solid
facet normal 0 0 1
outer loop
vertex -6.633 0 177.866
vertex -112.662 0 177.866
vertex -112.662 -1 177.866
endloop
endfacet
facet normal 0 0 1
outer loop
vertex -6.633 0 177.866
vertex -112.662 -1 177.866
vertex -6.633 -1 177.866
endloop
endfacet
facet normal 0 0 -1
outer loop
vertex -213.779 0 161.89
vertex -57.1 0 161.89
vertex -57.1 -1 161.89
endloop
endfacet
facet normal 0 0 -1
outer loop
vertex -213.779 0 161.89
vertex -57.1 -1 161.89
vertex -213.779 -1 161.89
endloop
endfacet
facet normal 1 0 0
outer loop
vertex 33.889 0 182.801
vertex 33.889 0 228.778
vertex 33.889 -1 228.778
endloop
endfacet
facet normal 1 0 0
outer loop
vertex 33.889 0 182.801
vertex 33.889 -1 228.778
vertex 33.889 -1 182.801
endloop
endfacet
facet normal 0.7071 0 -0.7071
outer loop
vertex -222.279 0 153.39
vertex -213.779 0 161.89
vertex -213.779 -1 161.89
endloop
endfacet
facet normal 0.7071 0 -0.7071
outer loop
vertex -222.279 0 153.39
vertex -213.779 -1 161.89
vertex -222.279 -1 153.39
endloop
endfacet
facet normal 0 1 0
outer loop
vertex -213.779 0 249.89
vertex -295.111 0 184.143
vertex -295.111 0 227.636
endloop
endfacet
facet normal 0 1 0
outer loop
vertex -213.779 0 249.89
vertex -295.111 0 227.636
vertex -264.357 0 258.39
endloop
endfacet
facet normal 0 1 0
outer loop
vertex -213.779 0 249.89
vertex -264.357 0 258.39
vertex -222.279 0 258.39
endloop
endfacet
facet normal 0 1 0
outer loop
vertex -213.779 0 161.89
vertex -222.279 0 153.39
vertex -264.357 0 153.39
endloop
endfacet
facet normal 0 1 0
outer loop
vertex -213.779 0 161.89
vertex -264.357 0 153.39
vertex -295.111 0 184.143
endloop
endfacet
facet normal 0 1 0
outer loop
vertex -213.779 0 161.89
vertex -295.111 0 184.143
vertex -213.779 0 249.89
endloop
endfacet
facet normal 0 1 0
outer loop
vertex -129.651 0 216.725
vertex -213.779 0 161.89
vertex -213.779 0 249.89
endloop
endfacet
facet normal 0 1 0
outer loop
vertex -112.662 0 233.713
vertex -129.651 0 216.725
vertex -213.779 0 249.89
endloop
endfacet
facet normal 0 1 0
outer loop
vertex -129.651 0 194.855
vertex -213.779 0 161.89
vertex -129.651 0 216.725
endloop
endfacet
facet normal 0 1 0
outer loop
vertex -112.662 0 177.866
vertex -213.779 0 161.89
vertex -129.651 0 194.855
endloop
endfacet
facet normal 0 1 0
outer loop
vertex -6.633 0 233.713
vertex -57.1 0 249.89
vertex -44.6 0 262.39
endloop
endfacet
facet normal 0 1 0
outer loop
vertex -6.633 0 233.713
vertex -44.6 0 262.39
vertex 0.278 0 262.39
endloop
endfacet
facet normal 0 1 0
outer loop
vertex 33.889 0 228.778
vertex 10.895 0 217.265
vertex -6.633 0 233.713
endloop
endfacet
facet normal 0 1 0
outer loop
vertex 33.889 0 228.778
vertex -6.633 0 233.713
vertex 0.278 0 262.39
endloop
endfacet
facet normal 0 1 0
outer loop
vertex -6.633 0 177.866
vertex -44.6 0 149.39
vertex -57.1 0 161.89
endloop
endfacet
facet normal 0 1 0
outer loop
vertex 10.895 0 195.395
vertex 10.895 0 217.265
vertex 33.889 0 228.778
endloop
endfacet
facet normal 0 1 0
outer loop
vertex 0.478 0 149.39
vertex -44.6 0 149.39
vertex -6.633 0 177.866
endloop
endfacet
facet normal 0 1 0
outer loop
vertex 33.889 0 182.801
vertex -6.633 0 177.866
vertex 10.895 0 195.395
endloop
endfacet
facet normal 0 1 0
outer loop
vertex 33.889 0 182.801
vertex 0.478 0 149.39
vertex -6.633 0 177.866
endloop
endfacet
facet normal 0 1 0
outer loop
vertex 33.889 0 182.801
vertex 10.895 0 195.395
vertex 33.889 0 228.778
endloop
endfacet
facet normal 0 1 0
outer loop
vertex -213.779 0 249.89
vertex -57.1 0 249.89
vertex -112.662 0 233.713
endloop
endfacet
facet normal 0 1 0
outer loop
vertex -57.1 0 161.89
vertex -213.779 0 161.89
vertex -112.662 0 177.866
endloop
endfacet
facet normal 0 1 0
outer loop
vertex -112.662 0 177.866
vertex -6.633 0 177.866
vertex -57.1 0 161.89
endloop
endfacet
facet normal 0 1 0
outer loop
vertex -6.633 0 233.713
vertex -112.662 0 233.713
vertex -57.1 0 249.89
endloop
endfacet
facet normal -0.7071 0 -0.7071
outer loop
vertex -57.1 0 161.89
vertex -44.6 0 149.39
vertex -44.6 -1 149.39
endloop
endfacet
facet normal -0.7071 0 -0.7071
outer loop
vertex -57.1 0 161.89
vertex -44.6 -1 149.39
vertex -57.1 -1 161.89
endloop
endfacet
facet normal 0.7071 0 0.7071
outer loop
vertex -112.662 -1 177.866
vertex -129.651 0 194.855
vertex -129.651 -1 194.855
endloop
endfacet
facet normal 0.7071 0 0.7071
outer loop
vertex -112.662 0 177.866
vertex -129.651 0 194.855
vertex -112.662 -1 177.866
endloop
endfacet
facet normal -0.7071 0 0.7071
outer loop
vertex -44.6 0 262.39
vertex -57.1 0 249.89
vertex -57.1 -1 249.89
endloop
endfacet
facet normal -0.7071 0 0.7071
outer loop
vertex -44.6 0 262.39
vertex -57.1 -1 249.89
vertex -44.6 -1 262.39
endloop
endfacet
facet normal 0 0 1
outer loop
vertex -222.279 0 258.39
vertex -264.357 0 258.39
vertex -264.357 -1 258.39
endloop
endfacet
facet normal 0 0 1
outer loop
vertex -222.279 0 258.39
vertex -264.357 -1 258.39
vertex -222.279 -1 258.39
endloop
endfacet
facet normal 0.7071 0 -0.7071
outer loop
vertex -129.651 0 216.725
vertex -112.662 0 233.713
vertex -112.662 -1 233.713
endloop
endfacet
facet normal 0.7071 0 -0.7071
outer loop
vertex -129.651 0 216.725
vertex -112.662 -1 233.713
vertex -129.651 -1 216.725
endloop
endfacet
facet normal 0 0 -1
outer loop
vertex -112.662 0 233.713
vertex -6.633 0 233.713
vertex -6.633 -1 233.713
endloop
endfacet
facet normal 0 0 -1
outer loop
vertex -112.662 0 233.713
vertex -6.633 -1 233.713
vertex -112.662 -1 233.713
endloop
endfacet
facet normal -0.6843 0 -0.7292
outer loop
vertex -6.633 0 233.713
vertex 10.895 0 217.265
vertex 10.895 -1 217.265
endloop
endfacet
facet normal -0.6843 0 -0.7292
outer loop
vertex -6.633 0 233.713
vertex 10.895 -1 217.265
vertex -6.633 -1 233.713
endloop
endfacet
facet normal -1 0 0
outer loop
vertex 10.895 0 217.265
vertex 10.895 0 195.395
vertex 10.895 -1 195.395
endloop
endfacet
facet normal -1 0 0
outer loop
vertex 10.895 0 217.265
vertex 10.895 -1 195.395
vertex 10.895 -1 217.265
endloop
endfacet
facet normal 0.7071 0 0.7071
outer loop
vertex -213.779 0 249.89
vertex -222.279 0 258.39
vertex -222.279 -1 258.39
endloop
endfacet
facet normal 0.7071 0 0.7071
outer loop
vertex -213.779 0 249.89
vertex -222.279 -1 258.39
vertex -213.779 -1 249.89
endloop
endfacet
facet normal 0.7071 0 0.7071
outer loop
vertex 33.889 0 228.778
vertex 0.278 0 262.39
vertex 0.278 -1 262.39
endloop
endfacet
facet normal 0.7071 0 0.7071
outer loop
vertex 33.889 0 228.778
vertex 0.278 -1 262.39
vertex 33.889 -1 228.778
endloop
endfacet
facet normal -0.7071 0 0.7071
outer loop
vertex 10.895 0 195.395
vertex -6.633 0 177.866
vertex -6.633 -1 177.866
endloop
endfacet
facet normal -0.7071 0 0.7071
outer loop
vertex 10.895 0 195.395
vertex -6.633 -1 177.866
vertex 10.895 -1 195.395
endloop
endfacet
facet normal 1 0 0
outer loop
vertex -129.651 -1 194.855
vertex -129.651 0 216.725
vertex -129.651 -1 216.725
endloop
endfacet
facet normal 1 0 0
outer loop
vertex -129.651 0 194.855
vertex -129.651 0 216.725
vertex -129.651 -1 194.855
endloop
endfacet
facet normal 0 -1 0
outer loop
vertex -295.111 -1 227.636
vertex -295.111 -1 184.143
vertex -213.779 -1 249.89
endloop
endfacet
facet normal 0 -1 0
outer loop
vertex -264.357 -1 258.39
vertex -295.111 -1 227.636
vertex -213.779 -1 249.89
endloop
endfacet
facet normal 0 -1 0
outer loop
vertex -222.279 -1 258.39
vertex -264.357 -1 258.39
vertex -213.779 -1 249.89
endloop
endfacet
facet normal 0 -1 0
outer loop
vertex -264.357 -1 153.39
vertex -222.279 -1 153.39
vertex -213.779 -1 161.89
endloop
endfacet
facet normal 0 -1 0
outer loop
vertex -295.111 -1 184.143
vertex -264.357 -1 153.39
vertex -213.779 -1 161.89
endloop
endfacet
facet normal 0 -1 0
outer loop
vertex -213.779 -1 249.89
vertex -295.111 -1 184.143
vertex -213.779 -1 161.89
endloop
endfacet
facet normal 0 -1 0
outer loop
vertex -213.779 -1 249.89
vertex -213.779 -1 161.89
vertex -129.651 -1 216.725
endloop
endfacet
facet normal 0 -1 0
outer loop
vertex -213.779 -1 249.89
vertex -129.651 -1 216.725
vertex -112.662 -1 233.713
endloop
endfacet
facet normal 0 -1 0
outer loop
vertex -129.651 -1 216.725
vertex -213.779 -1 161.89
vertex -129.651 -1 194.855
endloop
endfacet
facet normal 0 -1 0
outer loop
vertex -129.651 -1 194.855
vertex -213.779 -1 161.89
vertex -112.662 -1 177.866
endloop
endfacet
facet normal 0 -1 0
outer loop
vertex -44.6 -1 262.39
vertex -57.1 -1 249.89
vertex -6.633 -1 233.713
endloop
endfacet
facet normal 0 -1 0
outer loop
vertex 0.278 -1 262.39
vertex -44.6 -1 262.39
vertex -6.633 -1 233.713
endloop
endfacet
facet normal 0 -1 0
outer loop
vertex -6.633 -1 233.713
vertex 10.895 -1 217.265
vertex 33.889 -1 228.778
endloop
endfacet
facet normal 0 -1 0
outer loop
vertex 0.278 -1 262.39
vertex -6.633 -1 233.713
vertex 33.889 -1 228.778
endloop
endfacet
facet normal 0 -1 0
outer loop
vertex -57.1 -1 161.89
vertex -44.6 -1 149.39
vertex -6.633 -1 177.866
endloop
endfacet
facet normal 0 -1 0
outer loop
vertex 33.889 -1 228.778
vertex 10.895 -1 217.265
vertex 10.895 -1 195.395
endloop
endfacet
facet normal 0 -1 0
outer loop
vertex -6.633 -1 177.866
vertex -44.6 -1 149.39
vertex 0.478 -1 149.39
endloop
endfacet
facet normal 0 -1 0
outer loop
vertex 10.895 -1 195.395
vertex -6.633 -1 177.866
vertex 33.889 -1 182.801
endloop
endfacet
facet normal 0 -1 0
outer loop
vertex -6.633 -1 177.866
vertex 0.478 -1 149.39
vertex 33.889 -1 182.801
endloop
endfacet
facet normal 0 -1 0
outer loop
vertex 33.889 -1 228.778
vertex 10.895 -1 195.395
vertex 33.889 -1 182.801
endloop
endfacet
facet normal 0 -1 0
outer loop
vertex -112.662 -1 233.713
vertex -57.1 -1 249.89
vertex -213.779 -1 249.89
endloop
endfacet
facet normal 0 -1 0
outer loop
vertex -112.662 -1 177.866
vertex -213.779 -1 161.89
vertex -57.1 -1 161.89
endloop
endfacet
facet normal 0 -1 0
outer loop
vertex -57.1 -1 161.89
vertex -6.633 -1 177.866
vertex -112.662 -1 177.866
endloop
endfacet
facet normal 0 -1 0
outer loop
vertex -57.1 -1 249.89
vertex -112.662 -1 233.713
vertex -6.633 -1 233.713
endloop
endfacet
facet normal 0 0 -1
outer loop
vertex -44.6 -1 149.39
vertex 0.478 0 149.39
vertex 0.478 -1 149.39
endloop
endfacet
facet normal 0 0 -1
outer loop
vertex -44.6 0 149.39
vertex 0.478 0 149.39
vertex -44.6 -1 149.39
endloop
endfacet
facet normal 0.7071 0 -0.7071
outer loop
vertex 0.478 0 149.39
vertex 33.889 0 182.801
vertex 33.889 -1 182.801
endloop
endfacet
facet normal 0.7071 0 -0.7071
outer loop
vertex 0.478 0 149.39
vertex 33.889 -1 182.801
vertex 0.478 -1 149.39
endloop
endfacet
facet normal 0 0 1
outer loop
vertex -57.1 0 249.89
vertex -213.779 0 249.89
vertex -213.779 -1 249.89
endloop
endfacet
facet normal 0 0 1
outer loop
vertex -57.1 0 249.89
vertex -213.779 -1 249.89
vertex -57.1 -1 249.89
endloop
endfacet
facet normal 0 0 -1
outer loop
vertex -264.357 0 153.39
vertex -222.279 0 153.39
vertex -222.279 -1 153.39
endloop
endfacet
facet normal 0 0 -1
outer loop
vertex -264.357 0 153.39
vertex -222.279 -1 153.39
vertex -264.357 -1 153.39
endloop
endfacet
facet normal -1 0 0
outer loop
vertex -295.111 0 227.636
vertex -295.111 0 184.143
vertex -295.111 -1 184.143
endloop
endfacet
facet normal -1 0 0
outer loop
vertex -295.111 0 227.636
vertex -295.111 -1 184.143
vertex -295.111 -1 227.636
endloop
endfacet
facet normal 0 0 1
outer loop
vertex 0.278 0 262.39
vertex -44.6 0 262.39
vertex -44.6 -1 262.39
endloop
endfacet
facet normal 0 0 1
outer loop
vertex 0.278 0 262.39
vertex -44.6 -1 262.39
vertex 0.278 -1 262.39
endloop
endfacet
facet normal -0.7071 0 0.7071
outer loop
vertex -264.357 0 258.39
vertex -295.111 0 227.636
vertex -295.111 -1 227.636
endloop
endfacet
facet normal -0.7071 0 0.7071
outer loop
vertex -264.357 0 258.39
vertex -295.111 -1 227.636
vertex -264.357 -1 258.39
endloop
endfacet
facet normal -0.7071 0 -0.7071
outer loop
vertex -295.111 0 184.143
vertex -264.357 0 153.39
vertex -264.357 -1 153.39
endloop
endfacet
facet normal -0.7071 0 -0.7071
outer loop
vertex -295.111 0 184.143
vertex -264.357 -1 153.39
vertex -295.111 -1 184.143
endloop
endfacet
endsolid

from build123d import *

# Parameters (mm, degrees)
SM_BASE_FLANGE_1_DEPTH = 1
CUT_EXTRUDE_1_DEPTH    = 10


# Sheet-metal steps are written as plain solids
with BuildPart() as part:
    # Sketch 1 → Базовая кромка1 (new body)
    with BuildSketch(Plane(origin=(0, 0, 0), x_dir=(1, 0, 0), z_dir=(0, 1, 0))):
        Polygon((-57.720952925, -161.889640506), (-213.157461064, -161.889640506), (-213.778781408, -161.889640506), (-214.218121236, -161.450300678), (-222.278781408, -153.389640506), (-264.356991895, -153.389640506), (-295.11077987, -184.143428482), (-295.11077987, -227.635852531), (-264.356991895, -258.389640506), (-222.278781408, -258.389640506), (-214.218121236, -250.328980334), (-213.778781408, -249.889640506), (-213.157461064, -249.889640506), (-57.720952925, -249.889640506), (-57.099632582, -249.889640506), (-56.660292754, -250.328980334), (-44.599632582, -262.389640506), (0.278072842, -262.389640506), (33.88922013, -228.778493218), (33.88922013, -182.800787794), (0.478072842, -149.389640506), (-44.599632582, -149.389640506), (-56.660292754, -161.450300678), (-57.099632582, -161.889640506), align=None)
    extrude(amount=-SM_BASE_FLANGE_1_DEPTH)

    # Эскиз3 → Вырез-Вытянуть1 (cut)
    with BuildSketch(Plane(origin=(0, 0, 0), x_dir=(1, 0, 0), z_dir=(0, 1, 0))):
        Polygon((-129.650630124, -194.854768426), (-112.66234875, -177.866487052), (-6.632911498, -177.866487052), (10.895241956, -195.394640506), (10.895241956, -217.265248922), (-6.633389706, -233.712753004), (-112.662389706, -233.712753004), (-129.650630124, -216.724512586), align=None)
    extrude(amount=-CUT_EXTRUDE_1_DEPTH, mode=Mode.SUBTRACT)


solid = part.part
